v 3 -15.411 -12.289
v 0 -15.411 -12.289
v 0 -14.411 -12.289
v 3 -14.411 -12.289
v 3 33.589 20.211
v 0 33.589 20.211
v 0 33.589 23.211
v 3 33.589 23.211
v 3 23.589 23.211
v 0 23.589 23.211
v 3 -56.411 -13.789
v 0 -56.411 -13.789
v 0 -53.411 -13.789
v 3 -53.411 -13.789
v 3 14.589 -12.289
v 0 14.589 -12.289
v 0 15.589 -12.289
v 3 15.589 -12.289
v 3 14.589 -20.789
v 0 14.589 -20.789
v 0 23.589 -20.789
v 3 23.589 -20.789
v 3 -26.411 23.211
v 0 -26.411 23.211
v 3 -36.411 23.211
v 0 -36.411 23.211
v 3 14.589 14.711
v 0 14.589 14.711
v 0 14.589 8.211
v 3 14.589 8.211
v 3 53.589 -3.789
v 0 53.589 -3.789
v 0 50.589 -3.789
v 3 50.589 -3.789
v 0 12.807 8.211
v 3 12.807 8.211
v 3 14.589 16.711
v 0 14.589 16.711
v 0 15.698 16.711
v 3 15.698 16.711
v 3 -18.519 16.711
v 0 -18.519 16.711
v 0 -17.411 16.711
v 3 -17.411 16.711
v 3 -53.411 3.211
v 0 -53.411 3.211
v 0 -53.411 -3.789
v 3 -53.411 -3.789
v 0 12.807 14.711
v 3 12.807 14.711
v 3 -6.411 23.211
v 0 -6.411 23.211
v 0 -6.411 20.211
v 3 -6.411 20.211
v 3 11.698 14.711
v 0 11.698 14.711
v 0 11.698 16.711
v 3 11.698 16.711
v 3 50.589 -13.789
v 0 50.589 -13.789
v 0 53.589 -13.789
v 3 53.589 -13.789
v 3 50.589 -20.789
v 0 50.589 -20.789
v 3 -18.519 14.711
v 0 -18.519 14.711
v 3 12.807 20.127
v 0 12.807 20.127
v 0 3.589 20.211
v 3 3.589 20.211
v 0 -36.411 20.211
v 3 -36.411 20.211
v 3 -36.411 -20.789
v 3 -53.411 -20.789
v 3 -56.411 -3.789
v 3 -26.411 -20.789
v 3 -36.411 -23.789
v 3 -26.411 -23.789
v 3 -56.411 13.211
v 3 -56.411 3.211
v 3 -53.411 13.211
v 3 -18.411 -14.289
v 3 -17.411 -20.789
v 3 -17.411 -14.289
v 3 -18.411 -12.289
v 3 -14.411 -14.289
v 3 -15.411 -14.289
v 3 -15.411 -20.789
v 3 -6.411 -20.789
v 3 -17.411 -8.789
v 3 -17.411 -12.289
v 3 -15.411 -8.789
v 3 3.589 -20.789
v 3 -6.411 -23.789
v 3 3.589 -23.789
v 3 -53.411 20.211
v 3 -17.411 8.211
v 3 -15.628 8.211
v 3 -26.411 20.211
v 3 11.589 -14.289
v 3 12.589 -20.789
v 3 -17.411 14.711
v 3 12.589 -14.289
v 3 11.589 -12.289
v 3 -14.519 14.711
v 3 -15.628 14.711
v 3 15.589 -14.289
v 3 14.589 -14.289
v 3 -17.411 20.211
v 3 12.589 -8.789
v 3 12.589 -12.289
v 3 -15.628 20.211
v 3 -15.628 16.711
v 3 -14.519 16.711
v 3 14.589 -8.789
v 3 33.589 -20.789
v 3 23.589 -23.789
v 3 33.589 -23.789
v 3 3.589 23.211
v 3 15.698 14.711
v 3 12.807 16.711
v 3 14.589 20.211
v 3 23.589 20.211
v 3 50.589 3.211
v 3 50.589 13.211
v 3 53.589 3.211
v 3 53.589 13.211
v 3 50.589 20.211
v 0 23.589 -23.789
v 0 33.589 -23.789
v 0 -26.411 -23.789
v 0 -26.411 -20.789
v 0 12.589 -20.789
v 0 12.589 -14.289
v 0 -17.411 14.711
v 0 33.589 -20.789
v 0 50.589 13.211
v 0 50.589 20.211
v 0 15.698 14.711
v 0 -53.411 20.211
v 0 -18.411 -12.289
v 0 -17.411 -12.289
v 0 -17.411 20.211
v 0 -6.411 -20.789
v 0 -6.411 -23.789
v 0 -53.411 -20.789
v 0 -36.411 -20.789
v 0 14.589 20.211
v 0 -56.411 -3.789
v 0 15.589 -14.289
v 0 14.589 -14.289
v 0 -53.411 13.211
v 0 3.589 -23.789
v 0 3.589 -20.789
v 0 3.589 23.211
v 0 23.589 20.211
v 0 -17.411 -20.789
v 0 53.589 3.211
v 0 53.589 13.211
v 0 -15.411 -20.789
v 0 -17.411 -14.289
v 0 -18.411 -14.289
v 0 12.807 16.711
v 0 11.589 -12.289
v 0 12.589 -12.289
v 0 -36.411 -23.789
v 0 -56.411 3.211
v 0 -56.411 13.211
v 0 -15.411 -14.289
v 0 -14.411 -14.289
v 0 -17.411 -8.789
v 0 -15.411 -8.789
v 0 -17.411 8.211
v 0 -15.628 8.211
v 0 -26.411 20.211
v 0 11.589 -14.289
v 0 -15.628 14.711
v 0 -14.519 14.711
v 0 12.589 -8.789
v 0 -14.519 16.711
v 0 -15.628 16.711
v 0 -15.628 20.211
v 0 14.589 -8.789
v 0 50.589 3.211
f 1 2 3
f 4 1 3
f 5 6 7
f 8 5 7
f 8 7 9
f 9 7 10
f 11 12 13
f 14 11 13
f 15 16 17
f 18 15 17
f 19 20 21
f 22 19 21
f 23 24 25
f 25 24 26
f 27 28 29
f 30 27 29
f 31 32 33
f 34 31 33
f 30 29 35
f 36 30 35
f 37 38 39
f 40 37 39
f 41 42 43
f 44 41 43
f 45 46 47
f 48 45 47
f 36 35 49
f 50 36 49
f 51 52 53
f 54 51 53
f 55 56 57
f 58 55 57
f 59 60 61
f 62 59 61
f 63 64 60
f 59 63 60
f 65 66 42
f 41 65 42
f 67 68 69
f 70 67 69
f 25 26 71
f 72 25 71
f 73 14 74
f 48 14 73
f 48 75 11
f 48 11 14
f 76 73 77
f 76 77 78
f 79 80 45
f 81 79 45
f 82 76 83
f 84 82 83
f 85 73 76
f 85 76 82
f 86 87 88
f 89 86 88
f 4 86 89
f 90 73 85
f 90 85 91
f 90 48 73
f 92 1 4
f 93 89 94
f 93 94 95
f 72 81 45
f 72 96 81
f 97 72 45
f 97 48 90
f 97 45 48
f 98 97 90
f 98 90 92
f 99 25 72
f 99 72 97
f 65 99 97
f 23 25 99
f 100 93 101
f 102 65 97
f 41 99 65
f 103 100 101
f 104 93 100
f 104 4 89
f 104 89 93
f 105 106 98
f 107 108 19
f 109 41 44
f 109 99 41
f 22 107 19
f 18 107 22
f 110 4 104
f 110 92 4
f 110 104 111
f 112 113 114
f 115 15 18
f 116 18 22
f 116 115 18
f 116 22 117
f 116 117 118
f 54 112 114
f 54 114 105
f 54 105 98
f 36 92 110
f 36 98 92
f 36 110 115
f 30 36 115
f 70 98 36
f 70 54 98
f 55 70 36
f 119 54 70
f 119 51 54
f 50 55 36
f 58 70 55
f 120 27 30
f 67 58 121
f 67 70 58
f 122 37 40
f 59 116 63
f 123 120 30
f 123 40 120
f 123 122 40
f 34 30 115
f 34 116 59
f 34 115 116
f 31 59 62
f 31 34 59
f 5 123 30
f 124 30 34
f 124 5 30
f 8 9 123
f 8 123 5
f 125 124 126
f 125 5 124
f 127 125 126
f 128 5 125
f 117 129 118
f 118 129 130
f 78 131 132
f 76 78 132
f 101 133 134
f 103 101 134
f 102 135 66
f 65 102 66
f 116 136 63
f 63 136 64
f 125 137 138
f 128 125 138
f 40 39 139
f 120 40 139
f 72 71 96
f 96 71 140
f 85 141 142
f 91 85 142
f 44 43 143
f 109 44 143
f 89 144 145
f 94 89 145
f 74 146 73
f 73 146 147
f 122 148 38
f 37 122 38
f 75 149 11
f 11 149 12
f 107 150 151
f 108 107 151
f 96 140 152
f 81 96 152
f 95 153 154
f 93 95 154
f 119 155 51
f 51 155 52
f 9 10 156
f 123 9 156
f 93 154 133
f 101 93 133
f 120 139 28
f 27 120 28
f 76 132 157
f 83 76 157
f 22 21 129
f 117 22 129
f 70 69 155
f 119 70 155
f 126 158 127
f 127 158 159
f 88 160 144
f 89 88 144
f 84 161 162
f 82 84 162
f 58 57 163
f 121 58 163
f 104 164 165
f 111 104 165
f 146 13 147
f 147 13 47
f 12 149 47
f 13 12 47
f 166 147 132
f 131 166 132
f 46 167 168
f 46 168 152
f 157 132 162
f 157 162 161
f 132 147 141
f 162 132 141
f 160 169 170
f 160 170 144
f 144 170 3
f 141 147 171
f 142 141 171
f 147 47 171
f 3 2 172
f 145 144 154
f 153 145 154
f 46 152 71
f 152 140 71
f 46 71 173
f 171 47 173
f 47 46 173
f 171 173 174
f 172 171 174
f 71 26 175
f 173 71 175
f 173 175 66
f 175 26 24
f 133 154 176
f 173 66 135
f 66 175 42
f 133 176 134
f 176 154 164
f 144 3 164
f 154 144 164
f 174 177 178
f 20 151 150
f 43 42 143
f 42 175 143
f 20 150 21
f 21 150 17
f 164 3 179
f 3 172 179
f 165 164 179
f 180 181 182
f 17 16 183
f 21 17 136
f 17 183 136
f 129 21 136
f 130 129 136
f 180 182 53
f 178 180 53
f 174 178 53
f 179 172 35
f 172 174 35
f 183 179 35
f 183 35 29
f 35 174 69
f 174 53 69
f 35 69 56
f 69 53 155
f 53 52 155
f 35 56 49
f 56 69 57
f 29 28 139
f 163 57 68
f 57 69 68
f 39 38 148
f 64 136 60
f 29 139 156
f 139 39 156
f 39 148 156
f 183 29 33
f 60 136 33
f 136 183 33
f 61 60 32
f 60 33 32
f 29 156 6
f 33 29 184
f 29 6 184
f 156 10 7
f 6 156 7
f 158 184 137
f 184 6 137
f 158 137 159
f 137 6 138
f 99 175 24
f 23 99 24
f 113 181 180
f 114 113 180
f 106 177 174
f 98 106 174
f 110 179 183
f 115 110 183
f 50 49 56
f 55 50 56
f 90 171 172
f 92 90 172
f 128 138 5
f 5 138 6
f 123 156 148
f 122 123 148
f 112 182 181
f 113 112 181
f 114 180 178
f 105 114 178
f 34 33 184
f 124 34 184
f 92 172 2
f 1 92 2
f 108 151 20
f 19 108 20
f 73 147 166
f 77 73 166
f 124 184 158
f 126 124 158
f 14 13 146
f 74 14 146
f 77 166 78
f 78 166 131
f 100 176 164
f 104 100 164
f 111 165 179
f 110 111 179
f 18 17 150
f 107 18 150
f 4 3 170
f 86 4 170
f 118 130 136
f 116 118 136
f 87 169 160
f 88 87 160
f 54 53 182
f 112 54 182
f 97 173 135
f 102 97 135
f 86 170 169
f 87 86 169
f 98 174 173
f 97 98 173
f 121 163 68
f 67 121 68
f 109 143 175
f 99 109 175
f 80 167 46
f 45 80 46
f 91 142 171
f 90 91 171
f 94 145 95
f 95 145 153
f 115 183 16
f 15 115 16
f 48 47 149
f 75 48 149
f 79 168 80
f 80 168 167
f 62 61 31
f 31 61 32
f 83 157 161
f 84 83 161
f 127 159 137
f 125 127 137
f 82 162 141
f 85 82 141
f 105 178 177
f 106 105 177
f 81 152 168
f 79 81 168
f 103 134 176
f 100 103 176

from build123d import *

# Parameters (mm, degrees)
F1_DEPTH = 3


with BuildPart() as f1:
    # F0 (on Right) → F1 (new body)
    with BuildSketch(Plane.YZ):
        Polygon((33.589474, -20.788582), (50.589474, -20.788582), (50.589474, -13.788582), (53.589474, -13.788582), (53.589474, -3.788582), (50.589474, -3.788582), (50.589474, 3.211418), (53.589474, 3.211418), (53.589474, 13.211418), (50.589474, 13.211418), (50.589474, 20.211418), (33.589474, 20.211418), (33.589474, 23.211418), (23.589474, 23.211418), (23.589474, 20.211418), (14.589474, 20.211418), (14.589474, 16.711418), (15.698332, 16.711418), (15.698332, 14.711418), (14.589474, 14.711418), (14.589474, 8.211418), (12.80719, 8.211418), (12.80719, 14.711418), (11.698332, 14.711418), (11.698332, 16.711418), (12.80719, 16.711418), (12.80719, 20.12675), (3.589474, 20.211418), (3.589474, 23.211418), (-6.410526, 23.211418), (-6.410526, 20.211418), (-15.628242, 20.211418), (-15.628242, 16.711418), (-14.519384, 16.711418), (-14.519384, 14.711418), (-15.628242, 14.711418), (-15.628242, 8.211418), (-17.410526, 8.211418), (-17.410526, 14.711418), (-18.519384, 14.711418), (-18.519384, 16.711418), (-17.410526, 16.711418), (-17.410526, 20.211418), (-26.410526, 20.211418), (-26.410526, 23.211418), (-36.410526, 23.211418), (-36.410526, 20.211418), (-53.410526, 20.211418), (-53.410526, 13.211418), (-56.410526, 13.211418), (-56.410526, 3.211418), (-53.410526, 3.211418), (-53.410526, -3.788582), (-56.410526, -3.788582), (-56.410526, -13.788582), (-53.410526, -13.788582), (-53.410526, -20.788582), (-36.410526, -20.788582), (-36.410526, -23.788582), (-26.410526, -23.788582), (-26.410526, -20.788582), (-17.410526, -20.788582), (-17.410526, -14.288582), (-18.410526, -14.288582), (-18.410526, -12.288582), (-17.410526, -12.288582), (-17.410526, -8.788582), (-15.410526, -8.788582), (-15.410526, -12.288582), (-14.410526, -12.288582), (-14.410526, -14.288582), (-15.410526, -14.288582), (-15.410526, -20.788582), (-6.410526, -20.788582), (-6.410526, -23.788582), (3.589474, -23.788582), (3.589474, -20.788582), (12.589474, -20.788582), (12.589474, -14.288582), (11.589474, -14.288582), (11.589474, -12.288582), (12.589474, -12.288582), (12.589474, -8.788582), (14.589474, -8.788582), (14.589474, -12.288582), (15.589474, -12.288582), (15.589474, -14.288582), (14.589474, -14.288582), (14.589474, -20.788582), (23.589474, -20.788582), (23.589474, -23.788582), (33.589474, -23.788582), align=None)
    extrude(amount=F1_DEPTH)


solid = f1.part
